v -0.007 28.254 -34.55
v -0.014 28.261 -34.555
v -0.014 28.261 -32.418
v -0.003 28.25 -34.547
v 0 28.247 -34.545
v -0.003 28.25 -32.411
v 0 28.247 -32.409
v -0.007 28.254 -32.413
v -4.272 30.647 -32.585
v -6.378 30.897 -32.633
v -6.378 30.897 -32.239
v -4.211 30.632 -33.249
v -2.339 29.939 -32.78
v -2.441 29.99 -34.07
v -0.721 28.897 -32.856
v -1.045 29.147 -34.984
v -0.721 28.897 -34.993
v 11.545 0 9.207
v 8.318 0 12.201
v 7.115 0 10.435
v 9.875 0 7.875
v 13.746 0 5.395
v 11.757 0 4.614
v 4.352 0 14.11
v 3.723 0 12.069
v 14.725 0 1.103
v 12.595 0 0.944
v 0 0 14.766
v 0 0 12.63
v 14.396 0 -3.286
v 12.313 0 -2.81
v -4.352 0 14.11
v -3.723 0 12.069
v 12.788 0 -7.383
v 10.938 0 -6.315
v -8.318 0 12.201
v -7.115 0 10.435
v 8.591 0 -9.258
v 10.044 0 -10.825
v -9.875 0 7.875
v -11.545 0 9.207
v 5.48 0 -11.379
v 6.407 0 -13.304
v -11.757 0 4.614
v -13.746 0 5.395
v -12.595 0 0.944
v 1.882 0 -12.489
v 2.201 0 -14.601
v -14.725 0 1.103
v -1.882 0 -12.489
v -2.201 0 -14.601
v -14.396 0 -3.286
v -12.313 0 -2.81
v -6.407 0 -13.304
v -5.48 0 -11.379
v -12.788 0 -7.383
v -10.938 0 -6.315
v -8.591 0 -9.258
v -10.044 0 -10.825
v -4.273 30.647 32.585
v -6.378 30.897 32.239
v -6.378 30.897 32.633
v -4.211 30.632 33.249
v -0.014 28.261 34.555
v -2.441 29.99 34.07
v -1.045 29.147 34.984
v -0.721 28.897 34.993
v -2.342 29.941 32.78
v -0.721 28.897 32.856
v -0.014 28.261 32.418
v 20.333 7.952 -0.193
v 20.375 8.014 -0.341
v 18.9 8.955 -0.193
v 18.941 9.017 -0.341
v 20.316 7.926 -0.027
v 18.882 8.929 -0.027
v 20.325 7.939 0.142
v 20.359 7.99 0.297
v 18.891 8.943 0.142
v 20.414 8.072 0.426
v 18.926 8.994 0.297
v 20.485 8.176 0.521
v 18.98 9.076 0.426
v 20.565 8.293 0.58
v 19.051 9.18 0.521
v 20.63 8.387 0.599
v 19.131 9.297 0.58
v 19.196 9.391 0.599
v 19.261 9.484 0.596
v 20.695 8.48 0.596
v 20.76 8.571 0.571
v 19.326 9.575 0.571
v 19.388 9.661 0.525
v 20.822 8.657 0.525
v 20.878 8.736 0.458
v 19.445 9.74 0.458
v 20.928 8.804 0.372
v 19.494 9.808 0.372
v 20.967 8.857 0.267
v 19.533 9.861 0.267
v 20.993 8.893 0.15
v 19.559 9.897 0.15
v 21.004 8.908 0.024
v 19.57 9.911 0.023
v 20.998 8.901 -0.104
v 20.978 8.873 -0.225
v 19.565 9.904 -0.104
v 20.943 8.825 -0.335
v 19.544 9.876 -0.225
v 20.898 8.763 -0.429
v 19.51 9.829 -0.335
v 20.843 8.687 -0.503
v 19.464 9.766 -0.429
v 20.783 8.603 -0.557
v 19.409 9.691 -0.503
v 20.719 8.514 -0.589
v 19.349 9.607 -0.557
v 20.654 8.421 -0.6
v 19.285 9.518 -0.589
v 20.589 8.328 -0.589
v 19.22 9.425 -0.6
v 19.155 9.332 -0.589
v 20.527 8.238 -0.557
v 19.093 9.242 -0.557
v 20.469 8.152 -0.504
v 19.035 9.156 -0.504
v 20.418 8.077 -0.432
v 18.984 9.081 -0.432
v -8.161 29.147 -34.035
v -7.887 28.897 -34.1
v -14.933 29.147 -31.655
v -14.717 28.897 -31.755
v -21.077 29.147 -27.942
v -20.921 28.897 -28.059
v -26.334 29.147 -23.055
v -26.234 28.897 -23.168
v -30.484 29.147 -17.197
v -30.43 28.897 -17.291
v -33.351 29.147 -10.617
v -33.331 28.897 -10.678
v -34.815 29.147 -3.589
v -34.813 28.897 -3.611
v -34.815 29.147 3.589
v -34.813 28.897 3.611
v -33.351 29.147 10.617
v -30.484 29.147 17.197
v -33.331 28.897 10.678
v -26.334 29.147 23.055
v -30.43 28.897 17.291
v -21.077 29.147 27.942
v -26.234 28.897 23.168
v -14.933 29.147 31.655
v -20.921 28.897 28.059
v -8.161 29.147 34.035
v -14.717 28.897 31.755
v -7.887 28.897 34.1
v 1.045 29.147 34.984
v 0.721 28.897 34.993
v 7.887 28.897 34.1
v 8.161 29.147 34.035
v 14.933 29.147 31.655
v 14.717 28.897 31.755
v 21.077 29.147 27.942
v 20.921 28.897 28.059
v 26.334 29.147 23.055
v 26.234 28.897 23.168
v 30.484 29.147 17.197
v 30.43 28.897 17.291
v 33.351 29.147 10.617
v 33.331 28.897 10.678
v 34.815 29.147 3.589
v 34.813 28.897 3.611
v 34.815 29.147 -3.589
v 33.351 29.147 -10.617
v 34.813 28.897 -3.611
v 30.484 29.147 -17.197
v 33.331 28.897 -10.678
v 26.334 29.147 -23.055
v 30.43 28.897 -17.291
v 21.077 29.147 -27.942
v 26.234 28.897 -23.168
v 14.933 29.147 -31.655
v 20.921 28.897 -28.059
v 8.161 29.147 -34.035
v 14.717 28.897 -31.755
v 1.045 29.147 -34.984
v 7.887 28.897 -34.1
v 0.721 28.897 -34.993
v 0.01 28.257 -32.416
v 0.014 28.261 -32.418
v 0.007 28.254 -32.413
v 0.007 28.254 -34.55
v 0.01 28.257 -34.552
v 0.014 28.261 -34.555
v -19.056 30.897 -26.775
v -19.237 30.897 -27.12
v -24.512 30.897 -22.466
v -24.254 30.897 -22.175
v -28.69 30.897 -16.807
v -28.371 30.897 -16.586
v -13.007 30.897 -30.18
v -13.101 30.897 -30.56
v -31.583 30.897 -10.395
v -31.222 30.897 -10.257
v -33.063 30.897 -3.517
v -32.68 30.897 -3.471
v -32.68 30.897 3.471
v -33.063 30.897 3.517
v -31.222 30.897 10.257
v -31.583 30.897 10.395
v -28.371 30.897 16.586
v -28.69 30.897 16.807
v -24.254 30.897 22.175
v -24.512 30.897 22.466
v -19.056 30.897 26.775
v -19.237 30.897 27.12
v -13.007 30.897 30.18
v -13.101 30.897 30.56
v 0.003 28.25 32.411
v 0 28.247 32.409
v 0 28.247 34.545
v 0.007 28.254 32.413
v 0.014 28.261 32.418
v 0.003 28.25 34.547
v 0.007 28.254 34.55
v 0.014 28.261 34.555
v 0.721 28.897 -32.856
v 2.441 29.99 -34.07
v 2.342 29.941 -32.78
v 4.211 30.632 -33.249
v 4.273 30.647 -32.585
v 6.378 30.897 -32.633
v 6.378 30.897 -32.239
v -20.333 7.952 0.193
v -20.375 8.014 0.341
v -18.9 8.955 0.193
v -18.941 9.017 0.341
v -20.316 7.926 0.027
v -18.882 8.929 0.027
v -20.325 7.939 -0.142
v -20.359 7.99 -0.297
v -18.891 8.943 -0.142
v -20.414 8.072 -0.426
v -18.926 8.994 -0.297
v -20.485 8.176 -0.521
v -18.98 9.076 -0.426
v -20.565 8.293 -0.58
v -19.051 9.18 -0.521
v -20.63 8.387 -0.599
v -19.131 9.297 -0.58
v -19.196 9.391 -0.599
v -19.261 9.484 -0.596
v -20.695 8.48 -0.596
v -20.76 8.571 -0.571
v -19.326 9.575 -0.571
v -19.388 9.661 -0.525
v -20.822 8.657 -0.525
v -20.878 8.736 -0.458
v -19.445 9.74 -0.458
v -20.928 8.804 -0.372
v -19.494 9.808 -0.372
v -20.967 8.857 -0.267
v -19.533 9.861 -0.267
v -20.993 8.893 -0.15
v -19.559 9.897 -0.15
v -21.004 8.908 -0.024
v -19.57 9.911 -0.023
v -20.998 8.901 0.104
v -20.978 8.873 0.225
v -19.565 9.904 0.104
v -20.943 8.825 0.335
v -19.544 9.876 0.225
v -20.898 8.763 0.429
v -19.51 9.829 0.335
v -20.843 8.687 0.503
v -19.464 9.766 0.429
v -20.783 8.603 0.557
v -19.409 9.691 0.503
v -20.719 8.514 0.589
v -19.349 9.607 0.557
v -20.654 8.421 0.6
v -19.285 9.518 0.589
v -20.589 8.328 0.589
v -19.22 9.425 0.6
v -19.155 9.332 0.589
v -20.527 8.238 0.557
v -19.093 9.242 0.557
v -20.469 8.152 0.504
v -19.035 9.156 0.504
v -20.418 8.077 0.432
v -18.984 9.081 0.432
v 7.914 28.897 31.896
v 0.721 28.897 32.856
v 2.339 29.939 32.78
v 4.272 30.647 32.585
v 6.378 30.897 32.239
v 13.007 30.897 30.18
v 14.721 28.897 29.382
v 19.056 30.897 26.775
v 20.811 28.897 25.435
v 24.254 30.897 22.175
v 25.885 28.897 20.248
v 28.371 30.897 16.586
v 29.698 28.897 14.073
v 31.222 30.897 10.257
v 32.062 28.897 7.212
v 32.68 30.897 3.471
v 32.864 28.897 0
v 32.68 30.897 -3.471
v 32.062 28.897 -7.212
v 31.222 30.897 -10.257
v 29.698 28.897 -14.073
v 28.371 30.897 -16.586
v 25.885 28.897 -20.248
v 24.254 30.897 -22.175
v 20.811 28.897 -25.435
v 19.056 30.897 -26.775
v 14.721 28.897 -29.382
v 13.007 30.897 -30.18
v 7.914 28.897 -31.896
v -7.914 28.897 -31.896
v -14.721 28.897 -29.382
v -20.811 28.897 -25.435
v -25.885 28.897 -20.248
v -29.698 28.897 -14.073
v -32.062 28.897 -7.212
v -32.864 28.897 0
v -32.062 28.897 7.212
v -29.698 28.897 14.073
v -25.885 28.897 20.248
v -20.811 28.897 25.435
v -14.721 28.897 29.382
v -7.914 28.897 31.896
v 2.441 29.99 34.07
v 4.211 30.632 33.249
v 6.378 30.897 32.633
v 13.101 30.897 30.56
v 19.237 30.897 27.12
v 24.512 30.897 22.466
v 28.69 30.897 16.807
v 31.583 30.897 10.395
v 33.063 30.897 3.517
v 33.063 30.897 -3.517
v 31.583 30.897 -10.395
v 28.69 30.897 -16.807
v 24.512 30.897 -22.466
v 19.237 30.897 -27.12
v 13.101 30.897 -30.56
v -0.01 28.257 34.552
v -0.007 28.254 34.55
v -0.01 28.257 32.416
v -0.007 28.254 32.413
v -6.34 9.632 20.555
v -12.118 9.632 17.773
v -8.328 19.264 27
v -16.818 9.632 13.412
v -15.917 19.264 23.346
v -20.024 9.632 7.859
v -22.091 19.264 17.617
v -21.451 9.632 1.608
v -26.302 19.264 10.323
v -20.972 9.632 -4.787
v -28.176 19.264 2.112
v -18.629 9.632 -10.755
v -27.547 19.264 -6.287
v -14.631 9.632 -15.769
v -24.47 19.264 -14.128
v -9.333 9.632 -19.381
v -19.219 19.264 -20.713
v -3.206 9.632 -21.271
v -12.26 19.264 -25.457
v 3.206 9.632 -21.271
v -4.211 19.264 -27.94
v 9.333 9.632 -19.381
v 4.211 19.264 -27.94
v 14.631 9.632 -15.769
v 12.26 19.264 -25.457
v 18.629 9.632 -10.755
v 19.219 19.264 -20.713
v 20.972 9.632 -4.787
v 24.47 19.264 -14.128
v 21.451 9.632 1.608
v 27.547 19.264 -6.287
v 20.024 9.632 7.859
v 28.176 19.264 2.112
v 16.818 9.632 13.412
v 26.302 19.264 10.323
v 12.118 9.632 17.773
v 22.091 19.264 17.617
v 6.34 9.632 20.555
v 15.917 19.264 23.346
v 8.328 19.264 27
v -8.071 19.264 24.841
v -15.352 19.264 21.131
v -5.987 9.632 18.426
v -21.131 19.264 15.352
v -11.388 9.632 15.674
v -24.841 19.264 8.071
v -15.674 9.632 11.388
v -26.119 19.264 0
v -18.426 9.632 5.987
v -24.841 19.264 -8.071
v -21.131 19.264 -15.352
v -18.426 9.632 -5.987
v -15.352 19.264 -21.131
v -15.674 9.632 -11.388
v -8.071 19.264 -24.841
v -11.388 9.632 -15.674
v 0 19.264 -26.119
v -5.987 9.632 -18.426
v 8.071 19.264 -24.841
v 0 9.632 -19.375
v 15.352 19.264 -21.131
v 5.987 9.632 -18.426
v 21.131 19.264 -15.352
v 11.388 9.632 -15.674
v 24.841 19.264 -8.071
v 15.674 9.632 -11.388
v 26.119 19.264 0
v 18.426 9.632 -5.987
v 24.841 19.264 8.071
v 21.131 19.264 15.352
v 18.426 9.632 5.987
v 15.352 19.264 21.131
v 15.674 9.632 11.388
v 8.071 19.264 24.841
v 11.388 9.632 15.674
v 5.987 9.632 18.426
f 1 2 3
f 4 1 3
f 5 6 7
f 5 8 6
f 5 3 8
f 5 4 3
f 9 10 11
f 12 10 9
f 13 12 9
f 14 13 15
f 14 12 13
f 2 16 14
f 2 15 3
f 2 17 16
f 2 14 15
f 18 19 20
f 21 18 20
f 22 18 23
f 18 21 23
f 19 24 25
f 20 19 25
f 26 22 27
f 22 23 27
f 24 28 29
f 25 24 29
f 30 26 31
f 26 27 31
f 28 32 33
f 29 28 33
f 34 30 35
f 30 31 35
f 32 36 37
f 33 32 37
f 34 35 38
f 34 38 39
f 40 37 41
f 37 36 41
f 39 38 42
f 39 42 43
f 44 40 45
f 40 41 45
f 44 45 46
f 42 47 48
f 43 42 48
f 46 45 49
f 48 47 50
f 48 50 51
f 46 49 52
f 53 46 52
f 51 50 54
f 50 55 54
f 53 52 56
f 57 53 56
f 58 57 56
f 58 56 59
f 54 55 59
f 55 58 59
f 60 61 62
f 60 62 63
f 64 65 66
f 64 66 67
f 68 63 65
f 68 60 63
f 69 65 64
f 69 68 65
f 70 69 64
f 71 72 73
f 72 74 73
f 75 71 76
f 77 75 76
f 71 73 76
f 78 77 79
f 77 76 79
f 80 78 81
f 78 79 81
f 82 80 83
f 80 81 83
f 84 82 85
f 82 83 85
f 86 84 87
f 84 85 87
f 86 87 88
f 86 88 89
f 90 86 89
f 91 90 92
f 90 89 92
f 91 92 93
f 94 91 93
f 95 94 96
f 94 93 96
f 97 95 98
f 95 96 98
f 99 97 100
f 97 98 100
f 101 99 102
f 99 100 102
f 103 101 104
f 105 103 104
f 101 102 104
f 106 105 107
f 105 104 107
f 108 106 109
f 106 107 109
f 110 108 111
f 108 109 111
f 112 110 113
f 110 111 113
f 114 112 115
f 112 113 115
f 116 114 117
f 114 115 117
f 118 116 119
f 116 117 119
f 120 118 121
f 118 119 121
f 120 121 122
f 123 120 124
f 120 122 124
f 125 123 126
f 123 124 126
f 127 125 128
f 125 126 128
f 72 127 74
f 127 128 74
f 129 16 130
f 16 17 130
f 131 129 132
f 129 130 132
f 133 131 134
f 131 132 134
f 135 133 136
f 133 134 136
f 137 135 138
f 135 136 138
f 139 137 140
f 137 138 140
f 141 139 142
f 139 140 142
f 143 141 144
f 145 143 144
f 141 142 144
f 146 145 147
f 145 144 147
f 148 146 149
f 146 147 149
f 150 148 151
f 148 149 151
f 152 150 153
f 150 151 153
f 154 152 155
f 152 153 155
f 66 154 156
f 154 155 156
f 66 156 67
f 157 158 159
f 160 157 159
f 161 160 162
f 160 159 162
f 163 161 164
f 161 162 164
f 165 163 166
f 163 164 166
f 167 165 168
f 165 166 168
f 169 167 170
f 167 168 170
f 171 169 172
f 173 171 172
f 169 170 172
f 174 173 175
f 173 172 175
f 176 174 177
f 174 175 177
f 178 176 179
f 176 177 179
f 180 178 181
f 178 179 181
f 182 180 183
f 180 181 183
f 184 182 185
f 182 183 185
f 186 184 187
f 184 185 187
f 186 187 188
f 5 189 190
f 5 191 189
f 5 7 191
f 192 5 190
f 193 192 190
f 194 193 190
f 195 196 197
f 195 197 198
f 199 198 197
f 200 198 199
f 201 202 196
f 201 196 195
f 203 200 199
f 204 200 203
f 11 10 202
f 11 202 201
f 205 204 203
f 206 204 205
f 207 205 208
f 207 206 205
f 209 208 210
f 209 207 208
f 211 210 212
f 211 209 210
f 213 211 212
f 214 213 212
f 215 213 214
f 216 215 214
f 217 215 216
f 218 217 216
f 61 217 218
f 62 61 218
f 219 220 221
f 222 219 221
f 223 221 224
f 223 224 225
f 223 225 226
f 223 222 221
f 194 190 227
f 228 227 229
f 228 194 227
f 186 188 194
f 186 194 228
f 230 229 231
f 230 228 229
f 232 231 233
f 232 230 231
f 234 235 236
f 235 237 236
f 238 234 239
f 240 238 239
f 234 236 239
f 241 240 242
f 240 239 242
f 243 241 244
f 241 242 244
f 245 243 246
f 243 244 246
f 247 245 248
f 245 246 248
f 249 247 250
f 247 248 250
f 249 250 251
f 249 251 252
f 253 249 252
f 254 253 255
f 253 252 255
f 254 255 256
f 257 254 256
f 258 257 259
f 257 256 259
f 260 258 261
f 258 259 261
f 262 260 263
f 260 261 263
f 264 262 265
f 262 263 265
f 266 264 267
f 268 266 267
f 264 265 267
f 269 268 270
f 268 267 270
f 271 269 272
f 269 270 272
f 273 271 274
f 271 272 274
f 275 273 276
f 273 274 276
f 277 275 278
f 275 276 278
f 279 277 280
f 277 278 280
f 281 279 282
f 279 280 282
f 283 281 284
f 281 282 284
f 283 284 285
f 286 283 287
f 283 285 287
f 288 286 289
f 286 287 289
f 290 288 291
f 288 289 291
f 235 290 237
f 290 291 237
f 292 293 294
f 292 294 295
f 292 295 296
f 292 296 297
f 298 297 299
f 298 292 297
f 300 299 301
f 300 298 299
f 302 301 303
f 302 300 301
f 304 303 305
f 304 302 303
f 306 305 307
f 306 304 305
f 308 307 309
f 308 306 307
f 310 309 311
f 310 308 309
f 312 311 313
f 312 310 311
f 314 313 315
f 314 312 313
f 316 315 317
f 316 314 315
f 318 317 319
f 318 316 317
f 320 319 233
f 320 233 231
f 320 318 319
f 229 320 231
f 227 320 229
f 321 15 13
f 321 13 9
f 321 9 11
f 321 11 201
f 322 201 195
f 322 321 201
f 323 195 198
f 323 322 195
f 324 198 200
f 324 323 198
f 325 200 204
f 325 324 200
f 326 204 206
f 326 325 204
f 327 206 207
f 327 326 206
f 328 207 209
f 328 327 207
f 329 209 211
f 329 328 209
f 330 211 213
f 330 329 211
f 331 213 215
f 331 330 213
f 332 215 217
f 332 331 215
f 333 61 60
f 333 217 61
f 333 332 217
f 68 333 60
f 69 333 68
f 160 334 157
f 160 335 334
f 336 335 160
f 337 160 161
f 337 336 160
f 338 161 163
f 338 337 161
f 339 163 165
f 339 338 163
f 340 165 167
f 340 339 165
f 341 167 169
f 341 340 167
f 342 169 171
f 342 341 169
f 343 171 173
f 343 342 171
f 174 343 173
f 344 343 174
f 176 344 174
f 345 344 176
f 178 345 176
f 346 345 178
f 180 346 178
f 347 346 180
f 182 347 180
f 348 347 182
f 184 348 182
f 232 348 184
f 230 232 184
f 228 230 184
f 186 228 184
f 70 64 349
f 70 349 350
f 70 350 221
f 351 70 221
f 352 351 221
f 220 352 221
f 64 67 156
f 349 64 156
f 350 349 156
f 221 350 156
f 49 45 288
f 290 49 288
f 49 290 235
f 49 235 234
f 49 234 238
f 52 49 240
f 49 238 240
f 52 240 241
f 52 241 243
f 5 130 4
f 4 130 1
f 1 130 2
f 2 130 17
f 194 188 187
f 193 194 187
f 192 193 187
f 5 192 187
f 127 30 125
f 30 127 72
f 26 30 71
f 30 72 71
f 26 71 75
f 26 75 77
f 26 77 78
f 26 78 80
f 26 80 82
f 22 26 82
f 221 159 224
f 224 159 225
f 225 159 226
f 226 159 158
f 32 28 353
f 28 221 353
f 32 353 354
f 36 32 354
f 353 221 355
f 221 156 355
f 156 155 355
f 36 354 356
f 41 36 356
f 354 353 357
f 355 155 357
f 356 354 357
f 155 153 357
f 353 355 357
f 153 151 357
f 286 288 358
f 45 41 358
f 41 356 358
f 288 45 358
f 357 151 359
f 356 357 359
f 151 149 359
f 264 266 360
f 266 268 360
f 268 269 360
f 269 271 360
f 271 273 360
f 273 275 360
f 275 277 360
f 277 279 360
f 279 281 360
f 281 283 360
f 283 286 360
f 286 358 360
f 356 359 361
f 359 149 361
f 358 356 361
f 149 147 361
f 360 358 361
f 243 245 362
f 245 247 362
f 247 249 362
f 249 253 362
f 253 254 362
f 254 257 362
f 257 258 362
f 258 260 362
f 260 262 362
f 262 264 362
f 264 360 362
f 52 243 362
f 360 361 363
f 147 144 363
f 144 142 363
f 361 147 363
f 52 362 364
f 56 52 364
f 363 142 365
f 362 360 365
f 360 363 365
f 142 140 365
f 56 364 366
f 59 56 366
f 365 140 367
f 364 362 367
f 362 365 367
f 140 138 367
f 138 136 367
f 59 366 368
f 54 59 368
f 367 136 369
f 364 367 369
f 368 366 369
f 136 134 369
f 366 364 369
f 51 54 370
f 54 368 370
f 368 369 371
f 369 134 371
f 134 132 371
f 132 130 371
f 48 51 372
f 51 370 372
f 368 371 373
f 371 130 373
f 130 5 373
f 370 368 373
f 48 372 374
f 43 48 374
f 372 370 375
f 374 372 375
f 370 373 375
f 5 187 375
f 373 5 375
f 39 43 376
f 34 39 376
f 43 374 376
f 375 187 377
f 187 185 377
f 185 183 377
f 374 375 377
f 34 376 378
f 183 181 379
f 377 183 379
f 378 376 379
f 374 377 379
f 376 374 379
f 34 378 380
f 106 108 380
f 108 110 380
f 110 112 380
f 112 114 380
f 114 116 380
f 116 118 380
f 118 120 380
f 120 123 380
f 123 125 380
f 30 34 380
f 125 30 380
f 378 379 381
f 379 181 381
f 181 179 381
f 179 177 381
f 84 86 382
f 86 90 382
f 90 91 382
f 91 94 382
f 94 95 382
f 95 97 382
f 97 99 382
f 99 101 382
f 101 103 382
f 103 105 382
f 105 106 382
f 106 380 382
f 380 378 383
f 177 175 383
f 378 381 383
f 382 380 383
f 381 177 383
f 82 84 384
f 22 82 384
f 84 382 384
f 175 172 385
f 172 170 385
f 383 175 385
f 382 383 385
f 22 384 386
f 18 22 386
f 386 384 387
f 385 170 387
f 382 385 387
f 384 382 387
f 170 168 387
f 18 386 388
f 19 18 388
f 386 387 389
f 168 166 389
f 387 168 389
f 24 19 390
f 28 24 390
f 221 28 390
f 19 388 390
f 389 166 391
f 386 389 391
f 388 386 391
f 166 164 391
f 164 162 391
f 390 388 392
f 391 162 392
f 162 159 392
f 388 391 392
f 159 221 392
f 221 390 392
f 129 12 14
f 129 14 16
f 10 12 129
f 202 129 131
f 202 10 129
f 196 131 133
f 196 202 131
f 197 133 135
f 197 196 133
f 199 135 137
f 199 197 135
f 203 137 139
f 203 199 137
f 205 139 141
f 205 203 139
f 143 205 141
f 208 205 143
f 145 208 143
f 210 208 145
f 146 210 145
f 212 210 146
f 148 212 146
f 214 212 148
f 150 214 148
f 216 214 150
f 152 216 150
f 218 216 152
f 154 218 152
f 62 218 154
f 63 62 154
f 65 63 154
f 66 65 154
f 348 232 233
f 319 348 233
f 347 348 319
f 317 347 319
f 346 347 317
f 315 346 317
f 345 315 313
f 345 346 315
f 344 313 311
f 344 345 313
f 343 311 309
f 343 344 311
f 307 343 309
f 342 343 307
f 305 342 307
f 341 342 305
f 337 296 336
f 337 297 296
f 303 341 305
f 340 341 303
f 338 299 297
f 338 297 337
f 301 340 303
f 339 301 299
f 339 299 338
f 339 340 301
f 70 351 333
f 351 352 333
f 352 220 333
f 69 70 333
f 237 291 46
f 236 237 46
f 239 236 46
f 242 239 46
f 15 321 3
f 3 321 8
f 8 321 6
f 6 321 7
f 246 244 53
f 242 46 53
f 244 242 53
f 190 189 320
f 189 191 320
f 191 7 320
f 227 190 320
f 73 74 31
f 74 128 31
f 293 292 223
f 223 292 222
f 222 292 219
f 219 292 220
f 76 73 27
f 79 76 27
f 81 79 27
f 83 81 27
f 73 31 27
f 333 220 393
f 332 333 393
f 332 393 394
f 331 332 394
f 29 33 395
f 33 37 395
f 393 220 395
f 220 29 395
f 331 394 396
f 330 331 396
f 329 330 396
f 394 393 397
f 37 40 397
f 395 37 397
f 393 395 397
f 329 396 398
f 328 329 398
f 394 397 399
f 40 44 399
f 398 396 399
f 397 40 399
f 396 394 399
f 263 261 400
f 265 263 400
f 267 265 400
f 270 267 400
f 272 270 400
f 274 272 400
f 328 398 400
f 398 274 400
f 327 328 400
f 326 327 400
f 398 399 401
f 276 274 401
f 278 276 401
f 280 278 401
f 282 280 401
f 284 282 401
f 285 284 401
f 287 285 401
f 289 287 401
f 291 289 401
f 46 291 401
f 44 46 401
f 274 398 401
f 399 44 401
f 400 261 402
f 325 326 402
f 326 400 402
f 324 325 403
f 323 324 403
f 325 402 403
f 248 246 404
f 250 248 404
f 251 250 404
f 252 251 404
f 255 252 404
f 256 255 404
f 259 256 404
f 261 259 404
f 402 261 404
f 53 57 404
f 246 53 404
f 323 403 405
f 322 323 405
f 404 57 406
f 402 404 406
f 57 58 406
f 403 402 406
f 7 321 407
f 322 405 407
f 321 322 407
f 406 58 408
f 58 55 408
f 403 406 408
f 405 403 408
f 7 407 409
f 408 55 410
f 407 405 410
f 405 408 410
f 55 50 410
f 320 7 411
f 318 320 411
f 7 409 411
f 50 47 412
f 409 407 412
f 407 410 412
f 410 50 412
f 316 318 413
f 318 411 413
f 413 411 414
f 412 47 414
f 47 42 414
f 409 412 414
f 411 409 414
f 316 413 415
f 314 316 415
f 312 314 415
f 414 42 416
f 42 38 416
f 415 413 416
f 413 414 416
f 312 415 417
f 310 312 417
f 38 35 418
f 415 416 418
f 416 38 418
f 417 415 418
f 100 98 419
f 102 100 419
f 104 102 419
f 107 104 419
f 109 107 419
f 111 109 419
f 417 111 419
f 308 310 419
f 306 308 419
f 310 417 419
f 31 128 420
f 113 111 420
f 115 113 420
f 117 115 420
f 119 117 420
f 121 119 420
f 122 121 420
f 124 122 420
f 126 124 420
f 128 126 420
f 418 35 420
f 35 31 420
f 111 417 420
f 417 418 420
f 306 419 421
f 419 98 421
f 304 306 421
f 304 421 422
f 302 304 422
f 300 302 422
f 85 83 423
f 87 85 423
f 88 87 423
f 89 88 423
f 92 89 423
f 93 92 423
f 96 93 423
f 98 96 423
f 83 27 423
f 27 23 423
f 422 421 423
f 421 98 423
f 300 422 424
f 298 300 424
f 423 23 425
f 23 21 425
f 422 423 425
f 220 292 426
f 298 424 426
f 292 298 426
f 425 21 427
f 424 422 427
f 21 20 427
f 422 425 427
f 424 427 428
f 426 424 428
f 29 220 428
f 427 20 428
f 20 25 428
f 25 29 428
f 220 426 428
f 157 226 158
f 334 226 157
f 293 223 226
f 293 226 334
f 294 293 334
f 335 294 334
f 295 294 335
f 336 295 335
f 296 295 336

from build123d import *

# Parameters (mm, degrees)
SKETCH36_R              = 0.6
SIDE_HOLES_DEPTH        = 2
CIRPATTERN2_COUNT       = 2
SKETCH37_R              = 35
SKETCH37_R_2            = 32.86364447
BOSS_EXTRUDE1_DEPTH     = 2
CHAMFER2_SIZE           = 1.75
CUT_EXTRUDE1_DEPTH      = 59.348970142
CUT_EXTRUDE1_DEPTH_BACK = 59.348970142


with BuildPart() as part:
    # Sketch35 → Revolve1 (revolve)
    with BuildSketch(Plane.XY, mode=Mode.PRIVATE) as revolve1_sk:
        Polygon((32.86364447, 28.896639018), (12.63, 0), (14.76635553, 0), (35, 28.896639018), align=None)
    revolve(revolve1_sk.sketch.rotate(Axis((0, 28.896639018, 0), (0, -1, 0)), 90), axis=Axis((0, 28.896639018, 0), (0, -1, 0)))

    # Sketch36 → side-holes (cut, symmetric)
    with BuildSketch(Plane(origin=(8.474857205, -5.9341589, 0), x_dir=(0, 0, 1), z_dir=(-0.8191520442889934, 0.5735764363510439, 0))):
        with Locations(Location((0, 18.744270391, 0), (0, 0, 235.340174101))):
            Circle(SKETCH36_R)
    side_holes = extrude(amount=SIDE_HOLES_DEPTH, both=True, mode=Mode.SUBTRACT)

    # CirPattern2: side-holes ×2 about axis
    cirpattern2_axis = Axis((0, 0, 0), (0, 1, 0))
    for i in range(1, CIRPATTERN2_COUNT):
        add(side_holes.rotate(cirpattern2_axis, i * 360 / CIRPATTERN2_COUNT), mode=Mode.SUBTRACT)

    # Sketch37 → Boss-Extrude1 (add)
    with BuildSketch(Plane(origin=(0, 28.896639018, 0), x_dir=(1, 0, 0), z_dir=(0, 1, 0))):
        with Locations(Location((0, 0, 0), (0, 0, 270))):
            Circle(SKETCH37_R)
        with Locations(Location((0, 0, 0), (0, 0, 270))):
            Circle(SKETCH37_R_2, mode=Mode.SUBTRACT)
    extrude(amount=BOSS_EXTRUDE1_DEPTH)

    # Chamfer2
    chamfer2_edges = [part.edges().sort_by_distance(p)[0] for p in [
        (0, 30.896639018, -35),
    ]]
    chamfer(chamfer2_edges, length=CHAMFER2_SIZE)

    # Sketch38 → Cut-Extrude1 (cut, two sides: drawn at the far end of the back side and taken through both)
    with BuildSketch(Plane.XY.offset(-CUT_EXTRUDE1_DEPTH_BACK)):
        with BuildLine():
            Line((-0.013961031, 28.260600049), (0, 28.246639018))
            Line((0, 28.246639018), (0.013961031, 28.260600049))
            ThreePointArc((0.013961031, 28.260600049), (2.93377117, 30.211554811), (6.377922061, 30.896639018))
            Line((6.377922061, 30.896639018), (-6.377922061, 30.896639018))
            ThreePointArc((-6.377922061, 30.896639018), (-2.93377117, 30.211554811), (-0.013961031, 28.260600049))
        make_face()
    extrude(amount=CUT_EXTRUDE1_DEPTH + CUT_EXTRUDE1_DEPTH_BACK, mode=Mode.SUBTRACT)


solid = part.part
